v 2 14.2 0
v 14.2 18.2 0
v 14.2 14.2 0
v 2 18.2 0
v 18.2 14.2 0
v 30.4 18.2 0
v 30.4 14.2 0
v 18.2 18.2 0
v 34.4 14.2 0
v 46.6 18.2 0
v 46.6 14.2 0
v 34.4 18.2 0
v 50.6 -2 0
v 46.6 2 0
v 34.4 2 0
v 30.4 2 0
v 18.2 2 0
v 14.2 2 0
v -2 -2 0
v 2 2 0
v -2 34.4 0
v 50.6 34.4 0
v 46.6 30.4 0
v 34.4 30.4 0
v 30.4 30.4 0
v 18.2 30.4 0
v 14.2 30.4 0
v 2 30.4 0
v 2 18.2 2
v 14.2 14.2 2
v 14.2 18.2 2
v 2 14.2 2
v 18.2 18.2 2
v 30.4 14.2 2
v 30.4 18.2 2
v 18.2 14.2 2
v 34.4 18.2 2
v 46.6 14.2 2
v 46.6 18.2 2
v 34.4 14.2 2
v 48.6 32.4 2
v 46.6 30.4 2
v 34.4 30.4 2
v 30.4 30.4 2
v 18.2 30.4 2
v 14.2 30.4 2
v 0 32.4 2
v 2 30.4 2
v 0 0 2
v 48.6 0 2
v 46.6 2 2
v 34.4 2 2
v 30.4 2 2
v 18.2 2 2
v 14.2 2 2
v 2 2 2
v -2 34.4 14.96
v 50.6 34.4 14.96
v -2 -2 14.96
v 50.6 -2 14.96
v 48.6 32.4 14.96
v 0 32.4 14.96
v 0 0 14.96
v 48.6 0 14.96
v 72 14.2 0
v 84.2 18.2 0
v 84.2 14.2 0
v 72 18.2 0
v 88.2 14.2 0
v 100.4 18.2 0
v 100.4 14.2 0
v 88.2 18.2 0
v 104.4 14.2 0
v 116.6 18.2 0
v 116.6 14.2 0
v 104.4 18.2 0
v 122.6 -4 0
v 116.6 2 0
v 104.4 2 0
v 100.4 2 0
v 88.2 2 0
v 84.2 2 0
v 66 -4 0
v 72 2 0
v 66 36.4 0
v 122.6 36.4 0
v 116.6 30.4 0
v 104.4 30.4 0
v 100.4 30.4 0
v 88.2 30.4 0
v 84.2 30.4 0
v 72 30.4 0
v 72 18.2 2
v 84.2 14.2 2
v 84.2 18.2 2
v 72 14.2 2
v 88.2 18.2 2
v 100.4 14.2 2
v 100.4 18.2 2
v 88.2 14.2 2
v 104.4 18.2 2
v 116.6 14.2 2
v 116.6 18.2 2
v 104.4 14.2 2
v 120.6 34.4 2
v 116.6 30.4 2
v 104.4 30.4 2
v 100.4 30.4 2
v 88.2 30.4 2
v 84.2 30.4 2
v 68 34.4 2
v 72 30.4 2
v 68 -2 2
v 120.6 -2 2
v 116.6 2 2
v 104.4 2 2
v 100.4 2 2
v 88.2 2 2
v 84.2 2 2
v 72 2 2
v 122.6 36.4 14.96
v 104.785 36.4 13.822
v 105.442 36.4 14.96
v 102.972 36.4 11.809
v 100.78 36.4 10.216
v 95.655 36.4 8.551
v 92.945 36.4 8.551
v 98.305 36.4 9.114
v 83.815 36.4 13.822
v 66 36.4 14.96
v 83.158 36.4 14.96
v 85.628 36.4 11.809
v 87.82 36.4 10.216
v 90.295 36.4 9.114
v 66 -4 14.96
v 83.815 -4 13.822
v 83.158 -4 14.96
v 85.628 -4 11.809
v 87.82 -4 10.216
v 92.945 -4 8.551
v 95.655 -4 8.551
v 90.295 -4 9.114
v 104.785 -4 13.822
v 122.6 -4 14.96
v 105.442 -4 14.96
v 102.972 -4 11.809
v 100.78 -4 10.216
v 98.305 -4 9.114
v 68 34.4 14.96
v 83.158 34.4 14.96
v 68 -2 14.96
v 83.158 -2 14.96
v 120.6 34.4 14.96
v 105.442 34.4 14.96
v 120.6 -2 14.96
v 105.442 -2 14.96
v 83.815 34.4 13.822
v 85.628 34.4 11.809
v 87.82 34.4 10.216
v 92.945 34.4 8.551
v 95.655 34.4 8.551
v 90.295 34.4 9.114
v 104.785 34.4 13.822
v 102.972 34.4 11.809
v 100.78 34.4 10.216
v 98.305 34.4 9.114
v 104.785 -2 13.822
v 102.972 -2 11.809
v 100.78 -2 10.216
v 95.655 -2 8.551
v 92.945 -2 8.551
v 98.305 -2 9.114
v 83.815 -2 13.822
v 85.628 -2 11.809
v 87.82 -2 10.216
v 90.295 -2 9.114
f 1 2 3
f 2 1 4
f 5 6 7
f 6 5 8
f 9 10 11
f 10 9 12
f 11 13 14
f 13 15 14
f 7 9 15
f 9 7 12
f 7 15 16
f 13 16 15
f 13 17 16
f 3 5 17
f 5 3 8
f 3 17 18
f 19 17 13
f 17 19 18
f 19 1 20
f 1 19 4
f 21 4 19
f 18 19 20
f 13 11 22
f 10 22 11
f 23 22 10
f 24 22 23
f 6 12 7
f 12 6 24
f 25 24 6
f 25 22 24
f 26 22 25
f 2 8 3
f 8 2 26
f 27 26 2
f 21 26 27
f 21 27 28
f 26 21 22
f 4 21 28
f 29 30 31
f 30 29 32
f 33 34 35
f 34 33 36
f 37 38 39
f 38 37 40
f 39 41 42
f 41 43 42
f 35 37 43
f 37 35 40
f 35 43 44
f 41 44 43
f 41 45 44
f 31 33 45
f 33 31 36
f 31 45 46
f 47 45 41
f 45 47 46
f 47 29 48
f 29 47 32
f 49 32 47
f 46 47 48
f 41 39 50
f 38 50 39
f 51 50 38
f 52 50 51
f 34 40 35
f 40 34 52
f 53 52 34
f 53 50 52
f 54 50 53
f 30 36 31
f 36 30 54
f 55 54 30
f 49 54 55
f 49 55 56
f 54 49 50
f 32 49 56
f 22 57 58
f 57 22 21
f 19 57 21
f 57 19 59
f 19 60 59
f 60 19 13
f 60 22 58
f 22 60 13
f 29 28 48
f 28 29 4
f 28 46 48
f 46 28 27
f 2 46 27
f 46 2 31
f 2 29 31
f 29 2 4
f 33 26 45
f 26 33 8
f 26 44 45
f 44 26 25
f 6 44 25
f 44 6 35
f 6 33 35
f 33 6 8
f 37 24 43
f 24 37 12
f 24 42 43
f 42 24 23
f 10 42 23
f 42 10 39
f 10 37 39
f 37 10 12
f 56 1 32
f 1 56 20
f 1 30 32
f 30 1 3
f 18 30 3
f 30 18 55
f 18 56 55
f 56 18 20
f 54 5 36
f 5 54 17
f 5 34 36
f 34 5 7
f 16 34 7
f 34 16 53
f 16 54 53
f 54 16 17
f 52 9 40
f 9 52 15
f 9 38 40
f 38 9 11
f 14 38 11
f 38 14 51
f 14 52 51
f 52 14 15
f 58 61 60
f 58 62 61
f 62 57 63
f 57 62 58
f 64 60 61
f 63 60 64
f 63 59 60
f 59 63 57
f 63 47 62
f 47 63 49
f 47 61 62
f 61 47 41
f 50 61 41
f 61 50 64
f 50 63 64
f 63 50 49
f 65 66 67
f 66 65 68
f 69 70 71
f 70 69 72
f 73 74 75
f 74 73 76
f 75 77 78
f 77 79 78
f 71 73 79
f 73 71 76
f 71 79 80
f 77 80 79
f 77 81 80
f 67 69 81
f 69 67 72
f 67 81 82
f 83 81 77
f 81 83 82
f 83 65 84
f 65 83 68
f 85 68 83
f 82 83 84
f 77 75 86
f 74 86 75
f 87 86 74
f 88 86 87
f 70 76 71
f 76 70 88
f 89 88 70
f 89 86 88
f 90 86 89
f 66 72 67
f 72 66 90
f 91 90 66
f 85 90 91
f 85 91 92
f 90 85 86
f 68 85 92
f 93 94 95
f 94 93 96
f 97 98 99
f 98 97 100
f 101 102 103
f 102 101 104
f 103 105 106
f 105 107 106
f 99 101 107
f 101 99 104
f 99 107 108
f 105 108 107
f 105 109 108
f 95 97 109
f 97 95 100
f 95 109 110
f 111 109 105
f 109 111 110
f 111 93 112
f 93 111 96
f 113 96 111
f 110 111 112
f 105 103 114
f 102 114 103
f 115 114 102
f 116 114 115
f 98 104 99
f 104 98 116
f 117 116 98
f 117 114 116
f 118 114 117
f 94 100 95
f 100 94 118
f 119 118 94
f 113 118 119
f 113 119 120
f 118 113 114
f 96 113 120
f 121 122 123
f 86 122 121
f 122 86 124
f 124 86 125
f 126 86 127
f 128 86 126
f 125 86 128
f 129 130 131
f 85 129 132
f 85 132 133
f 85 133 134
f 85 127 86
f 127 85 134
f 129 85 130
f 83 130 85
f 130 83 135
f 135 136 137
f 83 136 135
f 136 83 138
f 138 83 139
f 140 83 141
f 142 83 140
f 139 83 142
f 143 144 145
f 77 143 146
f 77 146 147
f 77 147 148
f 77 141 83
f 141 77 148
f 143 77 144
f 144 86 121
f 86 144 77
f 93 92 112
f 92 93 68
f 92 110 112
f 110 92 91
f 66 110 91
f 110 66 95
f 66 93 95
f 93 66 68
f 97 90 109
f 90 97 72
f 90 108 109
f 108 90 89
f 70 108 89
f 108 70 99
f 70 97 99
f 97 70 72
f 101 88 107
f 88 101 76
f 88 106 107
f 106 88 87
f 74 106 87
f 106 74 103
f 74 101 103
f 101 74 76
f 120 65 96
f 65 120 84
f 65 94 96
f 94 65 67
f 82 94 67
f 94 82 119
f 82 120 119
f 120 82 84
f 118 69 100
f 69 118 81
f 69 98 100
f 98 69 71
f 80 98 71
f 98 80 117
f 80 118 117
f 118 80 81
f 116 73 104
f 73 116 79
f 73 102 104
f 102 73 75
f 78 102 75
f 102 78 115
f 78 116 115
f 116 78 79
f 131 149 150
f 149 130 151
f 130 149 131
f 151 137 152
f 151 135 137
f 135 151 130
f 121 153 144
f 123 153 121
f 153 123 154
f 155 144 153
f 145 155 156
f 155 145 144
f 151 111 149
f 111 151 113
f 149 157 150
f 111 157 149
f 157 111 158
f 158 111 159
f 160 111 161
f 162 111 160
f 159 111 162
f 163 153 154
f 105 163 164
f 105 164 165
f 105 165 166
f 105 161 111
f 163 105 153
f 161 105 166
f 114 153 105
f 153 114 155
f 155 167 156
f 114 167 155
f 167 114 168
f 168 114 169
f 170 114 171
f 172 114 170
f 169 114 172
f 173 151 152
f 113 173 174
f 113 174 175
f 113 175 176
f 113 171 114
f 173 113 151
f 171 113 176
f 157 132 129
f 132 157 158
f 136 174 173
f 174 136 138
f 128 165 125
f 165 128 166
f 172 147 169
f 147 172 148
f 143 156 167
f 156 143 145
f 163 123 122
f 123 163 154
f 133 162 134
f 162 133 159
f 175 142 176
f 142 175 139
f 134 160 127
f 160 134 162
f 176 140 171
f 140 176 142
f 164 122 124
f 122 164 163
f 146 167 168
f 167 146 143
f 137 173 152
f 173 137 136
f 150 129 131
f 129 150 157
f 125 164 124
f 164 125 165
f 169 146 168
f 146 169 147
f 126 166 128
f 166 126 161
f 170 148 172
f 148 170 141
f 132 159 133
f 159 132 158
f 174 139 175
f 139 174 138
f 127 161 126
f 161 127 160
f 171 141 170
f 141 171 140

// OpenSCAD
// file: diceware.scad
mm = 1;

die_width = 16.2 * mm;
wall_width = 2 * mm;
wall_height = 0.8 * die_width;
window_border = 2 * mm;

module clamshell()
{
    linear_extrude(wall_width) difference()
    {
        offset(delta = wall_width) children(0);
        if ($children > 1)
        {
            children(1);
        }
    }

    translate([ 0, 0, wall_width ]) linear_extrude(wall_height) difference()
    {
        offset(delta = wall_width) children(0);
        children(0);
    }
}

module window()
{
    offset(delta = -window_border) scale(die_width) polygon([ [ 0, 0 ], [ 1, 0 ], [ 1, 1 ], [ 0, 1 ] ]);
}

module diceware_bottom()
{
    clamshell()
    {
        // Base
        children(0);
        // Base Cutouts
        children(1);
    }
}

module diceware_top()
{
    difference()
    {
        clamshell()
        {
            // Base
            offset(delta = wall_width) children(0);

            // Base Cutouts
            children(1);
        }
        // Wall Cutouts
        children(2);
    }
}
// main file
include <diceware.scad>

module rect_base()
{
    scale([ die_width, die_width ]) polygon([ [ 0, 0 ], [ 3, 0 ], [ 3, 2 ], [ 0, 2 ] ]);
}

module rect_windows()
{
    for (x = [0:2])
    {
        for (y = [0:1])
        {
            translate(die_width * [ x, y ]) window();
        }
    }
}

module rect_bottom()
{
    diceware_bottom()
    {
        rect_base();
        rect_windows();
    }
}

module rect_top()
{
    diceware_top()
    {
        rect_base();
        rect_windows();
        translate([ 1.5 * die_width, -2 * wall_width - 0.1 * mm, wall_width + wall_height * 1.5 ]) rotate([ -90, 0, 0 ])
            cylinder(r = wall_height, h = 2 * die_width + 4 * wall_width + 0.2 * mm);
    }
}

rect_bottom();
translate([ 70, 0, 0 ]) rect_top();
